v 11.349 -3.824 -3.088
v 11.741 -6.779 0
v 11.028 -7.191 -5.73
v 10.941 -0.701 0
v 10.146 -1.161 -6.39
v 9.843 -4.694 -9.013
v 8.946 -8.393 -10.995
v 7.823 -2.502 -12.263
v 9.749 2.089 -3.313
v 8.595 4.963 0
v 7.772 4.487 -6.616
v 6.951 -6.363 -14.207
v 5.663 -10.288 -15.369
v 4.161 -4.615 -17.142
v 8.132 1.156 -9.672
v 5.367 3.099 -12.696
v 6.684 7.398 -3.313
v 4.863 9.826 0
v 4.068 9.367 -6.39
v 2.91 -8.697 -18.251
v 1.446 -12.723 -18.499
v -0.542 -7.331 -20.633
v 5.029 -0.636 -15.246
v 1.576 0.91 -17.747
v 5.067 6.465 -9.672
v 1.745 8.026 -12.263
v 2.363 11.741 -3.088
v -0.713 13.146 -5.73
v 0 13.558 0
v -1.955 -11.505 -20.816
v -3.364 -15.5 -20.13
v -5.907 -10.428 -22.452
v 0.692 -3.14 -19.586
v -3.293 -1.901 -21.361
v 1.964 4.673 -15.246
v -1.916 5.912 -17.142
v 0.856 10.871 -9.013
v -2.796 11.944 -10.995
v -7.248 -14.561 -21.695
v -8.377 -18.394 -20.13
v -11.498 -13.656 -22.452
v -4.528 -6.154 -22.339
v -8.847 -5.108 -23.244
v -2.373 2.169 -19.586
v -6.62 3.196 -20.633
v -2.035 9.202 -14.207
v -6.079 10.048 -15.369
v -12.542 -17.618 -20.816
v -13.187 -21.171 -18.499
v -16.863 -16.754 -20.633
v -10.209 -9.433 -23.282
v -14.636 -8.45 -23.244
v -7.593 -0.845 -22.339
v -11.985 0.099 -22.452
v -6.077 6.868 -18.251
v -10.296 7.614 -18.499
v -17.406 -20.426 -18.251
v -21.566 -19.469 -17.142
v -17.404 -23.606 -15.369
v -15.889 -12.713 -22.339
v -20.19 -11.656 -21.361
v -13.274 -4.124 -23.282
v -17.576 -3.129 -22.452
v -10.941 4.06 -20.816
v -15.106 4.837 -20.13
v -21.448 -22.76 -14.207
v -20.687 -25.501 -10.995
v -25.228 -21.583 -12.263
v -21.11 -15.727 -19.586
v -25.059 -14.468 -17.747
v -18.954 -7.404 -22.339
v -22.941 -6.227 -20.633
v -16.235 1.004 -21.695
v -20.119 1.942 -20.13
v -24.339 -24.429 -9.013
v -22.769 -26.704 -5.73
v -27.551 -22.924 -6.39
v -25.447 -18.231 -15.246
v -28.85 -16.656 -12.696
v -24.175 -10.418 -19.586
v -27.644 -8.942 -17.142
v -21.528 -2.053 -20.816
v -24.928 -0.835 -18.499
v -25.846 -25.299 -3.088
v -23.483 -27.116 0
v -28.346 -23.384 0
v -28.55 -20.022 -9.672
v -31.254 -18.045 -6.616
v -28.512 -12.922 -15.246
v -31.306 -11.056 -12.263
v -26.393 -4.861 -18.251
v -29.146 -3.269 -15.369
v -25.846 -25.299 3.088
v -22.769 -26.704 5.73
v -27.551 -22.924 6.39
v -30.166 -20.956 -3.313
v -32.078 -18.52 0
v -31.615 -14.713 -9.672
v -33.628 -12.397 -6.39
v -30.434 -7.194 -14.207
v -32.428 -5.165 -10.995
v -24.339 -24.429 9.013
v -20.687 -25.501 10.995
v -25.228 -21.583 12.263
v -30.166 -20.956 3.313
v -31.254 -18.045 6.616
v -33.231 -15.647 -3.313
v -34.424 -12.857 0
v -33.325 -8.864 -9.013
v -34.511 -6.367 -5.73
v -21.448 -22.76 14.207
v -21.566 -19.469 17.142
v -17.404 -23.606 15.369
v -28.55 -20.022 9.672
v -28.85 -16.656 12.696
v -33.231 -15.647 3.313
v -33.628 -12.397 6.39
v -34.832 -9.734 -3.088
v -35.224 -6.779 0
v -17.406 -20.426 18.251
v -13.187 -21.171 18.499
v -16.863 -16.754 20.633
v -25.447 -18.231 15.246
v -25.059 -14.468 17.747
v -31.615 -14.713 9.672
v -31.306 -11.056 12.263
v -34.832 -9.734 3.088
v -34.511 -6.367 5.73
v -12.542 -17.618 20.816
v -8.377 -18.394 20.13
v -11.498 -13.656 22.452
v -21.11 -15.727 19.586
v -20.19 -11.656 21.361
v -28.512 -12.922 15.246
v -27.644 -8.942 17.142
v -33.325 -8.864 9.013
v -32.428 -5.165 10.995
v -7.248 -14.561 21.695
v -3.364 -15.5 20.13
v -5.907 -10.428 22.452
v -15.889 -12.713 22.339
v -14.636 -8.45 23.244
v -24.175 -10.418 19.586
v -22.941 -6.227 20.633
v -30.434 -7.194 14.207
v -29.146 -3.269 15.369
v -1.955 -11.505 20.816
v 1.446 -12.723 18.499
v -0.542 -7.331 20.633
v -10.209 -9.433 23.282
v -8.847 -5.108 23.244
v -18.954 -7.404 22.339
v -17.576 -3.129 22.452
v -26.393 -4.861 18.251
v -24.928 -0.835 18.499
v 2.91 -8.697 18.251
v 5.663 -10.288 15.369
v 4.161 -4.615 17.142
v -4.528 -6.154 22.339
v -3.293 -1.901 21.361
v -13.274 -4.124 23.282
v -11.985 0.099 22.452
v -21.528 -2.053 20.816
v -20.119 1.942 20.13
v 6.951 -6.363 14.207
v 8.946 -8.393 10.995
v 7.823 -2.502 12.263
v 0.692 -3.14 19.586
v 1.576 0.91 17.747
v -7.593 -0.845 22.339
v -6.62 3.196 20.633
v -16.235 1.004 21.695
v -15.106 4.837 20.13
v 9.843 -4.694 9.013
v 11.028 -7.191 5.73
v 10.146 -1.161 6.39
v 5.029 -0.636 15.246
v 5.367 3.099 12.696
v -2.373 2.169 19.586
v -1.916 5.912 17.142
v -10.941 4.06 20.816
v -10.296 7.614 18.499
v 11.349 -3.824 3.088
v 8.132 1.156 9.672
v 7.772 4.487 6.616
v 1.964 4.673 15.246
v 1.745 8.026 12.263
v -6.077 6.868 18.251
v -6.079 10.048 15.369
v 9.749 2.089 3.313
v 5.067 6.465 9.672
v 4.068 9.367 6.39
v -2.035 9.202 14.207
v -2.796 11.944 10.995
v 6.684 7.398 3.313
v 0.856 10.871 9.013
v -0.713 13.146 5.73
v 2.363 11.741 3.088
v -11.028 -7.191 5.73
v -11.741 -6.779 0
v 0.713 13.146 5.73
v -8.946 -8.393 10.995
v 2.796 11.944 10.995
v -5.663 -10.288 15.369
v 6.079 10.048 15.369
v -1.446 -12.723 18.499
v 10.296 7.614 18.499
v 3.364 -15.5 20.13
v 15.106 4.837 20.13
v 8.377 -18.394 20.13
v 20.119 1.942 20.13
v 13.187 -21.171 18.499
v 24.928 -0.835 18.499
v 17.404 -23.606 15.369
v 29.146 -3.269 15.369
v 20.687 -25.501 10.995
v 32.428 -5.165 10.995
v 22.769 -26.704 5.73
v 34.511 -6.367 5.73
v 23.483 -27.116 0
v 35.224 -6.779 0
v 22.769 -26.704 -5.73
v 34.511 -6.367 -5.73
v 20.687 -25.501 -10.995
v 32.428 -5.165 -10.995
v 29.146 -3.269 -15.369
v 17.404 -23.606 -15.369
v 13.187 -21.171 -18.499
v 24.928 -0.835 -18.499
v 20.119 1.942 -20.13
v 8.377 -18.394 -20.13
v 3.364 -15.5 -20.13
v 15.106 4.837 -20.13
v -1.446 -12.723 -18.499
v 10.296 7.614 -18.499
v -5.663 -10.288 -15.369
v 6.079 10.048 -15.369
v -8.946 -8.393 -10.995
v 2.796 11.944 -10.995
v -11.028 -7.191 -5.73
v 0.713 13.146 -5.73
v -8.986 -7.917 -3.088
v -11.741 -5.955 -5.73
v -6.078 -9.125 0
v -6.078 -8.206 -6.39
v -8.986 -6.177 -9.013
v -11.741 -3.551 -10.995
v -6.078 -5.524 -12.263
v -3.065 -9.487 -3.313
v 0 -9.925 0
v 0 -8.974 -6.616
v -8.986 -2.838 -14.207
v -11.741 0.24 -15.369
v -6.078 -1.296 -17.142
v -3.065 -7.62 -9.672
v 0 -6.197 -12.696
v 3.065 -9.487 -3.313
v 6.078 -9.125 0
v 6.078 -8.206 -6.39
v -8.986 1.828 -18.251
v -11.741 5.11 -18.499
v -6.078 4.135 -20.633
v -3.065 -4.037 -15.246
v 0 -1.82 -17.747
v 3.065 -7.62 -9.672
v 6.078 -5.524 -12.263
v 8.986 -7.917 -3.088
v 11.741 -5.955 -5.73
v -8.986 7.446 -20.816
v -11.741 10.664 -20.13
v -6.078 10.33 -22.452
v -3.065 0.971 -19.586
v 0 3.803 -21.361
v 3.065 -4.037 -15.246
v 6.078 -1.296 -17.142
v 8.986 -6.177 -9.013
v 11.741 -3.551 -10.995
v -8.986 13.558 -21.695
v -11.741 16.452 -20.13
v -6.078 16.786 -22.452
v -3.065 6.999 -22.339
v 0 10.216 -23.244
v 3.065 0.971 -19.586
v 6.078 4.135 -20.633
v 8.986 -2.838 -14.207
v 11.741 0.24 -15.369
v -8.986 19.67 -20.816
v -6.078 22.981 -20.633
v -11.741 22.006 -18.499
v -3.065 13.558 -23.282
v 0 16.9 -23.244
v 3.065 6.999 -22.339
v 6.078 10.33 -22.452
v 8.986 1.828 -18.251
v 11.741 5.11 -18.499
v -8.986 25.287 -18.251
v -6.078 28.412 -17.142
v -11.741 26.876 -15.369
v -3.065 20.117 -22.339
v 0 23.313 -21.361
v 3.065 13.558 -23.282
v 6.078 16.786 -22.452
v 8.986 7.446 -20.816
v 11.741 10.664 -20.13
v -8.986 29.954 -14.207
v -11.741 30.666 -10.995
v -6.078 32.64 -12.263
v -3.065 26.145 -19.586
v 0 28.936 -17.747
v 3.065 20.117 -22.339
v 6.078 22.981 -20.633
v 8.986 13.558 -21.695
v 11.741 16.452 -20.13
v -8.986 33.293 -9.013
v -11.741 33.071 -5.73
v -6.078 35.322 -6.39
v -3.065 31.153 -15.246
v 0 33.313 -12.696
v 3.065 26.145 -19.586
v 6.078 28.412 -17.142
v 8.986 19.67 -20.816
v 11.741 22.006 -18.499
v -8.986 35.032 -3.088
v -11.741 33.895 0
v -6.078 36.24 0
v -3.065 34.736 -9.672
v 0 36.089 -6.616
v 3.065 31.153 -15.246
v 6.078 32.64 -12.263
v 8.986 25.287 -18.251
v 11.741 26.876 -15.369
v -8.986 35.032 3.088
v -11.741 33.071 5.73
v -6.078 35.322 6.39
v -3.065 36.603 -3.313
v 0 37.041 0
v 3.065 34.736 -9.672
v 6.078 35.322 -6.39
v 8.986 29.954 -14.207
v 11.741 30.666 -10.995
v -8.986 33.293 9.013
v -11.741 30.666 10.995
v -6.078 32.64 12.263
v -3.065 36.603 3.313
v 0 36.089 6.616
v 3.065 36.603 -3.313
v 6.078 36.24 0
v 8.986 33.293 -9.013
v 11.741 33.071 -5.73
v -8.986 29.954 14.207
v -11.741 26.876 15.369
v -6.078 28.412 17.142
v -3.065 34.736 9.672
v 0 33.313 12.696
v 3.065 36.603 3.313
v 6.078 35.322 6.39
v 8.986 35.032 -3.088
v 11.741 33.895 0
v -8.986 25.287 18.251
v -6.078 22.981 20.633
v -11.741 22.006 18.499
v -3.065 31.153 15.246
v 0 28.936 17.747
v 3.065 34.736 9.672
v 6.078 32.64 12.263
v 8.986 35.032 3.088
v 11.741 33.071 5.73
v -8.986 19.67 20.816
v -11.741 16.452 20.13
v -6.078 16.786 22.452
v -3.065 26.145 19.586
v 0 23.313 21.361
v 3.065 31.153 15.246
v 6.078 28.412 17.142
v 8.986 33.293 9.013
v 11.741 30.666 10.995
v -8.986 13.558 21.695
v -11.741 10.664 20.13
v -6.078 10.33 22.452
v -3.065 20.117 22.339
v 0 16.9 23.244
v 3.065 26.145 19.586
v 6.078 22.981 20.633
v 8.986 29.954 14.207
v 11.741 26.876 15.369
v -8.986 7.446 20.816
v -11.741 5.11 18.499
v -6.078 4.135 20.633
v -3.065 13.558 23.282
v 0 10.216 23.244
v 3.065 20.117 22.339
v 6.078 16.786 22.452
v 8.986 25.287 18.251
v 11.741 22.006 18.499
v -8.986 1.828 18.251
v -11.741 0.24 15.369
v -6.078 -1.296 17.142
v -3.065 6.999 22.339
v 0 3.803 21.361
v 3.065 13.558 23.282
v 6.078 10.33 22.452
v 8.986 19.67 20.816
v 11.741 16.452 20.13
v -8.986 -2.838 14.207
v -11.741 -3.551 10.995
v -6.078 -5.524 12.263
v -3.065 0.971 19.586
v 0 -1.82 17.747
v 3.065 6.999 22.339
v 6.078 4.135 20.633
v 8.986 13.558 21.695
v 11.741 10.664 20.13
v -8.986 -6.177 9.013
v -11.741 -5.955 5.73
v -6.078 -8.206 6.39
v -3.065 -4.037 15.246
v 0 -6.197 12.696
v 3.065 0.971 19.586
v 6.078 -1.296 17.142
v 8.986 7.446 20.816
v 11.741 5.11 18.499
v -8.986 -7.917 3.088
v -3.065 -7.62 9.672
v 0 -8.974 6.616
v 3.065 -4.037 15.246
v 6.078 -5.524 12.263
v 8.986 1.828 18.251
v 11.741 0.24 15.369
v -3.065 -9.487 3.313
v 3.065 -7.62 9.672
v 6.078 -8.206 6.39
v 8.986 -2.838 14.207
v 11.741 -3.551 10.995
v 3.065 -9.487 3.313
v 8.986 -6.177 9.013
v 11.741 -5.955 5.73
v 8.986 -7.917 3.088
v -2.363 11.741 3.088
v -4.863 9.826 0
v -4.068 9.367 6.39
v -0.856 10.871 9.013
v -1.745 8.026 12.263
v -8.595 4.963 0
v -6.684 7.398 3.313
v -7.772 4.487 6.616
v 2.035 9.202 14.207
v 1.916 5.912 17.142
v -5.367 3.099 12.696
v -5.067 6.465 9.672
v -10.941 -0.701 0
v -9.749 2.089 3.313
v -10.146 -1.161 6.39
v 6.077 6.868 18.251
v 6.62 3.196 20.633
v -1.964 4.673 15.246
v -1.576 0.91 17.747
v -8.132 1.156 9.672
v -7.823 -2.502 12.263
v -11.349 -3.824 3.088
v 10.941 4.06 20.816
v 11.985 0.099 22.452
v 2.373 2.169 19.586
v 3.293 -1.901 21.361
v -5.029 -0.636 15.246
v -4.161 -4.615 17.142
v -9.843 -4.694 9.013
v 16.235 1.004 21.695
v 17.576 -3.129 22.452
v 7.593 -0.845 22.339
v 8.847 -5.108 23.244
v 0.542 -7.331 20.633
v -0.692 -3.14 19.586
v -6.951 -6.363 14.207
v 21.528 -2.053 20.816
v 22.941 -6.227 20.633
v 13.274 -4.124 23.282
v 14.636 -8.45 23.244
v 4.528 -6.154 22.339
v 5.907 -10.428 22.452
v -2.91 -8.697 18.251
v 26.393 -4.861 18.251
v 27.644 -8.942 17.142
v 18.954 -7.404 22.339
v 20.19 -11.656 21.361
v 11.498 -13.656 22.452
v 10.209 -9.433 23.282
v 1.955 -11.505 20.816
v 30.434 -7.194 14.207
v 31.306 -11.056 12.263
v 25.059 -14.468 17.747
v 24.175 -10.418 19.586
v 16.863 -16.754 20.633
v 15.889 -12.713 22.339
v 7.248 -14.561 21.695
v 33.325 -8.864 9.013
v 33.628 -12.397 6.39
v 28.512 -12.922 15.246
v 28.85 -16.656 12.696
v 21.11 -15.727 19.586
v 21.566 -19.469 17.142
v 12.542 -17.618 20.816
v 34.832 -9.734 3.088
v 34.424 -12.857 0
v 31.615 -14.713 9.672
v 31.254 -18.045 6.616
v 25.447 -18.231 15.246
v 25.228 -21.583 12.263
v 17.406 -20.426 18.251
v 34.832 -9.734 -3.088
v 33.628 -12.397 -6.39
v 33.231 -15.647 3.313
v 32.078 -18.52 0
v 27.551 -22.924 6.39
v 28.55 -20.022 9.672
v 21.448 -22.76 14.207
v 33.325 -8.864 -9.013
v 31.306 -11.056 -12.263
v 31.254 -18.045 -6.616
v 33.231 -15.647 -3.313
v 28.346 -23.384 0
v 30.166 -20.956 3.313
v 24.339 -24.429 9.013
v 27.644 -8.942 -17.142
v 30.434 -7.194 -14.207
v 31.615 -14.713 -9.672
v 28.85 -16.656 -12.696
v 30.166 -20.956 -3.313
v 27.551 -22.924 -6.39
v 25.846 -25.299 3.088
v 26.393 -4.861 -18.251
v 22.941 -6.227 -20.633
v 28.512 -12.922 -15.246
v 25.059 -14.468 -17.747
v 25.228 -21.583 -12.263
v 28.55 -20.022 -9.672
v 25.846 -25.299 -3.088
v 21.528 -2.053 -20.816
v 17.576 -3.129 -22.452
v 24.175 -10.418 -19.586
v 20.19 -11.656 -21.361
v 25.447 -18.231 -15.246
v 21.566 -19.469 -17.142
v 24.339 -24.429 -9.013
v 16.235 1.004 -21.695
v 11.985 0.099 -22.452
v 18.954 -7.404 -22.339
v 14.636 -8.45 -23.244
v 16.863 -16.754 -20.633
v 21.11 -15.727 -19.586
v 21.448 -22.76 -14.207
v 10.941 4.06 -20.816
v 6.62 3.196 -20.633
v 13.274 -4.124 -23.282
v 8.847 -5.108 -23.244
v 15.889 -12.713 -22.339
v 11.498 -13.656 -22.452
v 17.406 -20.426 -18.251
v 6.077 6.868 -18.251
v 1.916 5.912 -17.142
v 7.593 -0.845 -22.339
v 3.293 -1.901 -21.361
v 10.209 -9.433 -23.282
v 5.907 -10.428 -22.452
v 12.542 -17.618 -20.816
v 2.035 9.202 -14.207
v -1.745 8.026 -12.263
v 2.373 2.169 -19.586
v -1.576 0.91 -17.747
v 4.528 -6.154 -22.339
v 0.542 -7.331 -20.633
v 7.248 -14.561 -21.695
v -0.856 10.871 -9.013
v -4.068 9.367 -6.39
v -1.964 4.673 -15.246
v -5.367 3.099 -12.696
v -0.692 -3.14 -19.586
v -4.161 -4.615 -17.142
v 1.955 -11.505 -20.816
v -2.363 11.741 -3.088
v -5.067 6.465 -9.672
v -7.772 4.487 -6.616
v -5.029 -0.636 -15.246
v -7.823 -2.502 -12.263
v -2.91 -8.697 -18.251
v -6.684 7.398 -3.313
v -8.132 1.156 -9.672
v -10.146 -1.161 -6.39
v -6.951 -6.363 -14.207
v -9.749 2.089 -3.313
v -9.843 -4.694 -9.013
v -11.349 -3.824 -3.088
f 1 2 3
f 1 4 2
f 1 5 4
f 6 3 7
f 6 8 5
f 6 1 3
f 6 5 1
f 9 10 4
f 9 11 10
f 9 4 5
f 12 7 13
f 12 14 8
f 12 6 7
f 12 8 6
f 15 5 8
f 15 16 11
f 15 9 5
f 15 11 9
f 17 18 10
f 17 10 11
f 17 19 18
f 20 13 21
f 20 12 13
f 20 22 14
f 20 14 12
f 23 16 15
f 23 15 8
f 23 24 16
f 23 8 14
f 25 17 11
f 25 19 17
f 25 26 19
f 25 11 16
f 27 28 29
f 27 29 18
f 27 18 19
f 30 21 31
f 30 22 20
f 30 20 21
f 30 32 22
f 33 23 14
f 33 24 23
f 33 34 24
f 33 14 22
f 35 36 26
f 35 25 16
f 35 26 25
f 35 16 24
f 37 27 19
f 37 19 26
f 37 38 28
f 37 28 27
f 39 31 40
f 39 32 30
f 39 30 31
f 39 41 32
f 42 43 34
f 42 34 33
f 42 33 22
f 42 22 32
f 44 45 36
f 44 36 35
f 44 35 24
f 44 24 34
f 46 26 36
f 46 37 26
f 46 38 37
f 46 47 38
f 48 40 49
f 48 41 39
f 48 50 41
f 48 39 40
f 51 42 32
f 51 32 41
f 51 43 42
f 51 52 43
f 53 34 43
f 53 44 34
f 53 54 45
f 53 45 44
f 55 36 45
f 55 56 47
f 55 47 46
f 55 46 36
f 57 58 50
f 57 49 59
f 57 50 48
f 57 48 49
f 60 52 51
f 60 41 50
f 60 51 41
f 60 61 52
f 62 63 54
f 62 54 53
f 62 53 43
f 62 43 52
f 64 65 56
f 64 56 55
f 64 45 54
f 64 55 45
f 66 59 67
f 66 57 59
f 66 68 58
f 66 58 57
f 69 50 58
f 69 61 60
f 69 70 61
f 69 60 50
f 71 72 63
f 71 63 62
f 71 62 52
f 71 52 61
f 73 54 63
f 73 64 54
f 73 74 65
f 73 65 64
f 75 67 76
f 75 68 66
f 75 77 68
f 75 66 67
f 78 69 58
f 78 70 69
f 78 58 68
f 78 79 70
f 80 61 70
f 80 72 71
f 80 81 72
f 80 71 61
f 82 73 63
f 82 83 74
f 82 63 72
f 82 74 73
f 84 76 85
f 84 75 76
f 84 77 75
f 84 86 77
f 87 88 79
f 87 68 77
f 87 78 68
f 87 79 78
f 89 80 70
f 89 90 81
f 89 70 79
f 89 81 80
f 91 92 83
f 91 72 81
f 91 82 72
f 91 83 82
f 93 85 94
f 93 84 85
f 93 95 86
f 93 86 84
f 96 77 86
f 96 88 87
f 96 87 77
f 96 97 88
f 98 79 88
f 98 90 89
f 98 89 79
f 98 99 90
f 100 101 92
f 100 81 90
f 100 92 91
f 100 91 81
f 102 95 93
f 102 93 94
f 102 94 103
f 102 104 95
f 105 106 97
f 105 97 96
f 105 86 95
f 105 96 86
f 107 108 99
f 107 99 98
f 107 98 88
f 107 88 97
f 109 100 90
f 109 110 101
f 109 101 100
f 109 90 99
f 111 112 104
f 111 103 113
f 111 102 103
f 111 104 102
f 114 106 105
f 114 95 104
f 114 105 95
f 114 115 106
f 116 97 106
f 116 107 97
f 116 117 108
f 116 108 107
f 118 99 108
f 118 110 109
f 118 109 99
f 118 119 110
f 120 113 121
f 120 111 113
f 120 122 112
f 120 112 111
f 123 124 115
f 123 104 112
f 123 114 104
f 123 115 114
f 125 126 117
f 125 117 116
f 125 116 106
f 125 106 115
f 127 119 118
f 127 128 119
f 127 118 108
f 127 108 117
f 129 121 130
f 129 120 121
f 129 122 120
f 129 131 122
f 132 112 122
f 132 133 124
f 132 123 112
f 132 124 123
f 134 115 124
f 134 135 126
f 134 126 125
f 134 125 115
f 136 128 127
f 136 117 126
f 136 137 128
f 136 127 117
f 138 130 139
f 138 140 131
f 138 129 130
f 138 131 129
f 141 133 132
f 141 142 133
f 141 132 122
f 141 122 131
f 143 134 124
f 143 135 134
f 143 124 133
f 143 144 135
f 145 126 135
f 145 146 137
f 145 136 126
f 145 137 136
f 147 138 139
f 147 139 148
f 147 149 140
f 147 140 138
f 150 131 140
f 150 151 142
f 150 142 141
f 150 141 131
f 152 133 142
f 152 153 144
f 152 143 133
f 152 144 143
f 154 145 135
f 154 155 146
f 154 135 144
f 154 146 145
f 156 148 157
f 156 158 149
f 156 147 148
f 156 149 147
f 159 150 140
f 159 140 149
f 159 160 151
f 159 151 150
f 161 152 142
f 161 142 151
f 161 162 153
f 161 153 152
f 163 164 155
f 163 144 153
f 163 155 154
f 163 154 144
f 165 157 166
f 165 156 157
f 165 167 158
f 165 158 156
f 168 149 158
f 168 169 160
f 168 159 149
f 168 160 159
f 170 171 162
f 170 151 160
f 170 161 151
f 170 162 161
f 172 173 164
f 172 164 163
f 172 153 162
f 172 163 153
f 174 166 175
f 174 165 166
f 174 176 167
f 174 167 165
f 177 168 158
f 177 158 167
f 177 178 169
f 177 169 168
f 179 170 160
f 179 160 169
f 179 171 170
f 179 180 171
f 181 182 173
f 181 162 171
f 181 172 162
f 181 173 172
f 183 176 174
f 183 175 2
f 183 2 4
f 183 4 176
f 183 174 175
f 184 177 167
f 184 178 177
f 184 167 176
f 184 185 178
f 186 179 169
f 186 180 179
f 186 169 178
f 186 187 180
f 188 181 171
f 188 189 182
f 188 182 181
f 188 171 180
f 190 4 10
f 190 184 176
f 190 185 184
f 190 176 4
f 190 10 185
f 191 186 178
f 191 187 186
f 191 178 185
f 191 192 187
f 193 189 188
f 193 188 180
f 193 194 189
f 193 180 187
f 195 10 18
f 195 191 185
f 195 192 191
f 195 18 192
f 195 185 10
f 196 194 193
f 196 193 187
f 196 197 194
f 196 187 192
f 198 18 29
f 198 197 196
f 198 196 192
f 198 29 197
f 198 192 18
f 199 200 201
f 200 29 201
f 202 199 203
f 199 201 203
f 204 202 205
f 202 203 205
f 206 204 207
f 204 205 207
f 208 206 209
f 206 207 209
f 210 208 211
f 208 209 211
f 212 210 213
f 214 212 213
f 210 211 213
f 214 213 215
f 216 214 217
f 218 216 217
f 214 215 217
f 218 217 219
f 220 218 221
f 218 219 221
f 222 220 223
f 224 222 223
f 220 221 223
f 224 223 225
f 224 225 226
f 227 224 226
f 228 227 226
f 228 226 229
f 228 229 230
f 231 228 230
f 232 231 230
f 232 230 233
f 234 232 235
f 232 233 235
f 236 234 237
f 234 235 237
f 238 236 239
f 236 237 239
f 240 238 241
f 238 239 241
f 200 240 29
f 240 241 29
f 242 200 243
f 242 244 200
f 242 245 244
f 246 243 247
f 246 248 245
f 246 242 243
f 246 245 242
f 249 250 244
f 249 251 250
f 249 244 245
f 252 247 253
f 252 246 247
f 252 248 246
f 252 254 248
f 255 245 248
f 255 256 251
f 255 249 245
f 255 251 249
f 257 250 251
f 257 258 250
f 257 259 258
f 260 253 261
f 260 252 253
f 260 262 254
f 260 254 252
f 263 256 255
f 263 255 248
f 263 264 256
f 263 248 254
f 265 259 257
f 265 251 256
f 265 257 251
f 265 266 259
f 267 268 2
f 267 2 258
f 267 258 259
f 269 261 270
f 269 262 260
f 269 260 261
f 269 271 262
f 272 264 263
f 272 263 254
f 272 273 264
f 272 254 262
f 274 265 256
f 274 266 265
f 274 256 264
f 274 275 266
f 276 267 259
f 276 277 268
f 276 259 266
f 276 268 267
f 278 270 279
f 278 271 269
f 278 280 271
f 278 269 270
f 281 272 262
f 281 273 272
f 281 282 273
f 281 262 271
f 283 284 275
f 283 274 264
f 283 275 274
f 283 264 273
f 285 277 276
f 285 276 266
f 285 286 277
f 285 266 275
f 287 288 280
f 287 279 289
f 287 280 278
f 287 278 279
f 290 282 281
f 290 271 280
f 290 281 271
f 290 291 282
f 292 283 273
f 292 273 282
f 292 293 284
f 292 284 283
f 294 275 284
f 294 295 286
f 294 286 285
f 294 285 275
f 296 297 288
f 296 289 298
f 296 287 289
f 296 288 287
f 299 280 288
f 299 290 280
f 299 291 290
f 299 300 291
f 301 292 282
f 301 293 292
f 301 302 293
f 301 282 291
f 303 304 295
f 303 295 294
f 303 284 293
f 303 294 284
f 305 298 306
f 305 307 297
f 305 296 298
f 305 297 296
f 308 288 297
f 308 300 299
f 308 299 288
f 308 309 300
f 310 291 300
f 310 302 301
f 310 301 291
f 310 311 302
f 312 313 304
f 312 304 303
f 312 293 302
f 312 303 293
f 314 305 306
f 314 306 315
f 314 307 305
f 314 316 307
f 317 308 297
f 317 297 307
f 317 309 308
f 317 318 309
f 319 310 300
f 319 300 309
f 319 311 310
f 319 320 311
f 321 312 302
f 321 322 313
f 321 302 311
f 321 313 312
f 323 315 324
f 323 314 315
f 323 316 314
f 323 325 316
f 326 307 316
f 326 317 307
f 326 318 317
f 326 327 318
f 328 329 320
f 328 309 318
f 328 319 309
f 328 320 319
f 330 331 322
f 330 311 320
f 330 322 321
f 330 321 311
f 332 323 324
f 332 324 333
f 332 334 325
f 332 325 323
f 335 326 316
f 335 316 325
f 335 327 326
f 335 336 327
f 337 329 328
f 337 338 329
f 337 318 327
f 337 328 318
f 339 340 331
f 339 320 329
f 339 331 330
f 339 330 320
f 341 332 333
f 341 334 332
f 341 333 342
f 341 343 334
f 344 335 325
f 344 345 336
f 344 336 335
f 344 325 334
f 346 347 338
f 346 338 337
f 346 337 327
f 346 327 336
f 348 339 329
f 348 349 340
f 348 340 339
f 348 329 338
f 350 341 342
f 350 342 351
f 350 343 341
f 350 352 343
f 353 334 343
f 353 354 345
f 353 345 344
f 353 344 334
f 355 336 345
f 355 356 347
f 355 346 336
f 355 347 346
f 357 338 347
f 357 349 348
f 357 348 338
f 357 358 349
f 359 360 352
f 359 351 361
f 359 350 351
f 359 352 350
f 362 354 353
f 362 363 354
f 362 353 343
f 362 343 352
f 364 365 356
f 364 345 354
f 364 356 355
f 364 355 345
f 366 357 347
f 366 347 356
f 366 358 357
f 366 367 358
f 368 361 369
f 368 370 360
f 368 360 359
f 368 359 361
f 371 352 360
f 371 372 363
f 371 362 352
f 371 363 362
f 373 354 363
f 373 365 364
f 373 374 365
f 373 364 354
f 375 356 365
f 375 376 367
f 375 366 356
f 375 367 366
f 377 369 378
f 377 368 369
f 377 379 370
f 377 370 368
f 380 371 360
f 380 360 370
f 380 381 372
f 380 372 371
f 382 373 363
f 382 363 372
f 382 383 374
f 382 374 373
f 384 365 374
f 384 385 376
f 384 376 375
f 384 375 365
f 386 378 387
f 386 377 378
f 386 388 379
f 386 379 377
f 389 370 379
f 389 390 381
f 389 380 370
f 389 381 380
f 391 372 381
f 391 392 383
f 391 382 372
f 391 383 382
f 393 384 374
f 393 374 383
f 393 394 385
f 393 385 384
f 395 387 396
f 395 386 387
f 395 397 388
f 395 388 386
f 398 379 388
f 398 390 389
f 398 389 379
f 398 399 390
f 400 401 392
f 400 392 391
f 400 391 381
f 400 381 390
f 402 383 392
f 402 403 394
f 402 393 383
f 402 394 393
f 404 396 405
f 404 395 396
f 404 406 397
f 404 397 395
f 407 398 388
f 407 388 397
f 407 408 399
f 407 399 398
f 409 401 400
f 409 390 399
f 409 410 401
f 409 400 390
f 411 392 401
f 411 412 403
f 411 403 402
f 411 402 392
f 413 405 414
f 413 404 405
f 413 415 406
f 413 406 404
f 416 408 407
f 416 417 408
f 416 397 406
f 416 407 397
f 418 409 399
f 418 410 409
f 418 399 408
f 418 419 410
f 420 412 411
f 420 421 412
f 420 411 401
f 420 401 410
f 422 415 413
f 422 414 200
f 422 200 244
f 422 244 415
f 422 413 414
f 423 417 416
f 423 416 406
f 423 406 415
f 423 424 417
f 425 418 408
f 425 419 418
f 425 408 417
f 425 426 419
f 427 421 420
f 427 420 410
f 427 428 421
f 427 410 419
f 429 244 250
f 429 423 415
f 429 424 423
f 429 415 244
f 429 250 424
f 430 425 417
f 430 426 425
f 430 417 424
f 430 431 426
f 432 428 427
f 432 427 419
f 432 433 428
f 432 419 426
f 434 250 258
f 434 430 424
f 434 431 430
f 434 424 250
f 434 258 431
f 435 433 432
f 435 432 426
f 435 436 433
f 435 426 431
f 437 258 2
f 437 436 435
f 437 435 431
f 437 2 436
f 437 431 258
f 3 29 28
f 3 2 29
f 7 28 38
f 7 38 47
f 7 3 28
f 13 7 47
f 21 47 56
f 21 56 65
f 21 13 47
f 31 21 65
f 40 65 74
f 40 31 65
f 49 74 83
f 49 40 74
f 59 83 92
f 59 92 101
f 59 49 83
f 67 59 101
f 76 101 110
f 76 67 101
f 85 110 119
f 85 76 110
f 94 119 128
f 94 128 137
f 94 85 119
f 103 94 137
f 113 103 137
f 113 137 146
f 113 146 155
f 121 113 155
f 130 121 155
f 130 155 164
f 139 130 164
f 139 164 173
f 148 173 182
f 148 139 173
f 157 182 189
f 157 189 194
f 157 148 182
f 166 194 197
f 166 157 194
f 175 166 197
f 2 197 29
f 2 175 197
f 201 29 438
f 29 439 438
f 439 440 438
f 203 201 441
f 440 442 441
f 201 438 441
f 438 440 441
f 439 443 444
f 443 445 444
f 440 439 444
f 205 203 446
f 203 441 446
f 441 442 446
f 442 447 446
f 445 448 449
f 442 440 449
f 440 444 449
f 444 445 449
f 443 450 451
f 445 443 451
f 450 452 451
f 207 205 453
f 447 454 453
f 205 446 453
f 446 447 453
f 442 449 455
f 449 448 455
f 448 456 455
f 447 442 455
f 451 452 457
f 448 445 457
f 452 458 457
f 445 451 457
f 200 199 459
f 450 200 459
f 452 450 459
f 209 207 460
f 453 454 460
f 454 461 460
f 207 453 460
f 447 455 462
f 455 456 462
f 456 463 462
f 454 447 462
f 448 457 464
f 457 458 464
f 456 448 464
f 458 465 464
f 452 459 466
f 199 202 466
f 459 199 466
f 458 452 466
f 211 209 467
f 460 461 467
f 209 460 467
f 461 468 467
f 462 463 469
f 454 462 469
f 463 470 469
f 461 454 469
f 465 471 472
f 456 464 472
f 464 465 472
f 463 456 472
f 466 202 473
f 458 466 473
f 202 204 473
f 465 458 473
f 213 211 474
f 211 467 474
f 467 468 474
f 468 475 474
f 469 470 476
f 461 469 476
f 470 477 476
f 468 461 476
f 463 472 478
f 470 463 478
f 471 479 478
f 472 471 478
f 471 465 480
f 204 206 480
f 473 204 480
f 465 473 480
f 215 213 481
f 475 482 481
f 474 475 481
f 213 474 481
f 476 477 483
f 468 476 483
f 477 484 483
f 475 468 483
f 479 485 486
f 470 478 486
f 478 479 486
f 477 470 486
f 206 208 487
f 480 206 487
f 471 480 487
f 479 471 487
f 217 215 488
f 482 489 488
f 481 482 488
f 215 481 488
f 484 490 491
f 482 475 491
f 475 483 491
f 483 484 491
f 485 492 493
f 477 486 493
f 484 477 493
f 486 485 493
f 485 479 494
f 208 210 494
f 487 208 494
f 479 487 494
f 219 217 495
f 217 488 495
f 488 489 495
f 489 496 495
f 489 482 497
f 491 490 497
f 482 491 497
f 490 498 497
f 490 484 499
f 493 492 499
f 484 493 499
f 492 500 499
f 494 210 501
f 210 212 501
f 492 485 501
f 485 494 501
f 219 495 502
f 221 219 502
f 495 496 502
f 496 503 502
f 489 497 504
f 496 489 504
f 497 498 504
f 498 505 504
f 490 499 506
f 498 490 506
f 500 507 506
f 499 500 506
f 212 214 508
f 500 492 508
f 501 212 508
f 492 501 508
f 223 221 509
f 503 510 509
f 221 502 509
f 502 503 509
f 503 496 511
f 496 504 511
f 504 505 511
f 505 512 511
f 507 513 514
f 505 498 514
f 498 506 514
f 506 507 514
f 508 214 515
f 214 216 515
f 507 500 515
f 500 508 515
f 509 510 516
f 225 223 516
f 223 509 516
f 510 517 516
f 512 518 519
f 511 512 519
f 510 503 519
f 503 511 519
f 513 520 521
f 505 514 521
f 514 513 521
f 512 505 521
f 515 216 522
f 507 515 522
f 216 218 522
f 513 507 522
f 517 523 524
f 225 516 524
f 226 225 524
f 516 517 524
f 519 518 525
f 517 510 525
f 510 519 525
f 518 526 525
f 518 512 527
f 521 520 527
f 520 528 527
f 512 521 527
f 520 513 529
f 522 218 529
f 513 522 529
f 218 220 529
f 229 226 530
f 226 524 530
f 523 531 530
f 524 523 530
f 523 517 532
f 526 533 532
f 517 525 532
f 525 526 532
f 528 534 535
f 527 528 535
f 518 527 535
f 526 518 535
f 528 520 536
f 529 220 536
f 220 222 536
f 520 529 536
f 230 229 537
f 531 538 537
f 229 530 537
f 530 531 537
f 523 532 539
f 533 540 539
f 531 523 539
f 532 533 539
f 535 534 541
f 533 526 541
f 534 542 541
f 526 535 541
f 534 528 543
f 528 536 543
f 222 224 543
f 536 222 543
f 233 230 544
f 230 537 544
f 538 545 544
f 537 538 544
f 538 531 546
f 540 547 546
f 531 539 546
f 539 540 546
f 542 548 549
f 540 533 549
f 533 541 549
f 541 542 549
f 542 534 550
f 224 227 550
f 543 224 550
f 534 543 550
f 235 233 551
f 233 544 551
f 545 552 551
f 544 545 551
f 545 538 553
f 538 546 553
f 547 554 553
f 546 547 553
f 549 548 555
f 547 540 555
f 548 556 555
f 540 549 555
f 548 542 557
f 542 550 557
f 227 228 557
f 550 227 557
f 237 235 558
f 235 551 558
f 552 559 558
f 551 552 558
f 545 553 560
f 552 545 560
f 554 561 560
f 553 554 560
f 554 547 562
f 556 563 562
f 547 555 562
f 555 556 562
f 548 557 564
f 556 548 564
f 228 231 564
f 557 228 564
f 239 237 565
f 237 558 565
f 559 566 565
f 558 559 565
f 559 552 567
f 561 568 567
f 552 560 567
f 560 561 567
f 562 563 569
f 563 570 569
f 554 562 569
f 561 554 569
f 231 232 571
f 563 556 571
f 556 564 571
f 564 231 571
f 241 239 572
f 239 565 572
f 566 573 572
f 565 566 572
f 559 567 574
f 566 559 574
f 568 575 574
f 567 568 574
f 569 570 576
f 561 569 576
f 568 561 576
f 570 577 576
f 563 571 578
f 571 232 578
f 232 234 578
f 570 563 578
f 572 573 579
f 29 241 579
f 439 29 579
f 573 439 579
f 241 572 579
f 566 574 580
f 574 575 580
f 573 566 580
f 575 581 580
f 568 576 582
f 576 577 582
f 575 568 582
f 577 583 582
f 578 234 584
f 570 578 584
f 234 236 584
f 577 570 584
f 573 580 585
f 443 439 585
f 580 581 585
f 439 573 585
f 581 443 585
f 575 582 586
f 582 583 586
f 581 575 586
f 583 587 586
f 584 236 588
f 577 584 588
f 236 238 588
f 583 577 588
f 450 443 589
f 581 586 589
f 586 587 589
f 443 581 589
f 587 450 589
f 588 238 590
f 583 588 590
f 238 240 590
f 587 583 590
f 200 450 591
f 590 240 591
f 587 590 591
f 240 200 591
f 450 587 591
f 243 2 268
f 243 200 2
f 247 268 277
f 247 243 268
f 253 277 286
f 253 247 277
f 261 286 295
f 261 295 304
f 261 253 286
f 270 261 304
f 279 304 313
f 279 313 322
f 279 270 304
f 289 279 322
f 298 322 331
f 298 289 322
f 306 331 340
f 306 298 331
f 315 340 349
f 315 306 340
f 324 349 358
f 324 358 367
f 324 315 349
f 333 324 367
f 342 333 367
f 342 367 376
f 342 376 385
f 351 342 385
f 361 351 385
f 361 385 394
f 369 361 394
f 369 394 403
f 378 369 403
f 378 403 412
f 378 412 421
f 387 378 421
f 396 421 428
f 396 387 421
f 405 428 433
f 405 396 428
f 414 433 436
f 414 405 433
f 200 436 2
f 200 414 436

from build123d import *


with BuildPart() as f1:
    # F0 (on Top) → F1 (revolve)
    with BuildSketch(Plane.XY):
        with BuildLine():
            Line((11.741411, -6.778907), (-11.741411, -6.778907))
            ThreePointArc((-11.741411, -6.778907), (0, -9.925008), (11.741411, -6.778907))
        make_face()
    revolve(axis=Axis((-0.623311, 13.557813, 0), (1, 0, 0)))


with BuildPart() as f2:
    # F0 (on Top) → F2 (revolve)
    with BuildSketch(Plane.XY):
        with BuildLine():
            Line((-11.741411, -6.778907), (0, 13.557813))
            ThreePointArc((0, 13.557813), (-8.595309, 4.962504), (-11.741411, -6.778907))
        make_face()
    revolve(axis=Axis((15.367259, -0.498753, 0), (0.5, 0.866025, 0)))


with BuildPart() as f3:
    # F0 (on Top) → F3 (revolve)
    with BuildSketch(Plane.XY):
        with BuildLine():
            ThreePointArc((11.741411, -6.778907), (8.595309, 4.962504), (0, 13.557813))
            Line((0, 13.557813), (11.741411, -6.778907))
        make_face()
    revolve(axis=Axis((-15.130864, -0.908201, 0), (-0.5, 0.866025, 0)))


solid = Compound([f1.part, f2.part, f3.part])
